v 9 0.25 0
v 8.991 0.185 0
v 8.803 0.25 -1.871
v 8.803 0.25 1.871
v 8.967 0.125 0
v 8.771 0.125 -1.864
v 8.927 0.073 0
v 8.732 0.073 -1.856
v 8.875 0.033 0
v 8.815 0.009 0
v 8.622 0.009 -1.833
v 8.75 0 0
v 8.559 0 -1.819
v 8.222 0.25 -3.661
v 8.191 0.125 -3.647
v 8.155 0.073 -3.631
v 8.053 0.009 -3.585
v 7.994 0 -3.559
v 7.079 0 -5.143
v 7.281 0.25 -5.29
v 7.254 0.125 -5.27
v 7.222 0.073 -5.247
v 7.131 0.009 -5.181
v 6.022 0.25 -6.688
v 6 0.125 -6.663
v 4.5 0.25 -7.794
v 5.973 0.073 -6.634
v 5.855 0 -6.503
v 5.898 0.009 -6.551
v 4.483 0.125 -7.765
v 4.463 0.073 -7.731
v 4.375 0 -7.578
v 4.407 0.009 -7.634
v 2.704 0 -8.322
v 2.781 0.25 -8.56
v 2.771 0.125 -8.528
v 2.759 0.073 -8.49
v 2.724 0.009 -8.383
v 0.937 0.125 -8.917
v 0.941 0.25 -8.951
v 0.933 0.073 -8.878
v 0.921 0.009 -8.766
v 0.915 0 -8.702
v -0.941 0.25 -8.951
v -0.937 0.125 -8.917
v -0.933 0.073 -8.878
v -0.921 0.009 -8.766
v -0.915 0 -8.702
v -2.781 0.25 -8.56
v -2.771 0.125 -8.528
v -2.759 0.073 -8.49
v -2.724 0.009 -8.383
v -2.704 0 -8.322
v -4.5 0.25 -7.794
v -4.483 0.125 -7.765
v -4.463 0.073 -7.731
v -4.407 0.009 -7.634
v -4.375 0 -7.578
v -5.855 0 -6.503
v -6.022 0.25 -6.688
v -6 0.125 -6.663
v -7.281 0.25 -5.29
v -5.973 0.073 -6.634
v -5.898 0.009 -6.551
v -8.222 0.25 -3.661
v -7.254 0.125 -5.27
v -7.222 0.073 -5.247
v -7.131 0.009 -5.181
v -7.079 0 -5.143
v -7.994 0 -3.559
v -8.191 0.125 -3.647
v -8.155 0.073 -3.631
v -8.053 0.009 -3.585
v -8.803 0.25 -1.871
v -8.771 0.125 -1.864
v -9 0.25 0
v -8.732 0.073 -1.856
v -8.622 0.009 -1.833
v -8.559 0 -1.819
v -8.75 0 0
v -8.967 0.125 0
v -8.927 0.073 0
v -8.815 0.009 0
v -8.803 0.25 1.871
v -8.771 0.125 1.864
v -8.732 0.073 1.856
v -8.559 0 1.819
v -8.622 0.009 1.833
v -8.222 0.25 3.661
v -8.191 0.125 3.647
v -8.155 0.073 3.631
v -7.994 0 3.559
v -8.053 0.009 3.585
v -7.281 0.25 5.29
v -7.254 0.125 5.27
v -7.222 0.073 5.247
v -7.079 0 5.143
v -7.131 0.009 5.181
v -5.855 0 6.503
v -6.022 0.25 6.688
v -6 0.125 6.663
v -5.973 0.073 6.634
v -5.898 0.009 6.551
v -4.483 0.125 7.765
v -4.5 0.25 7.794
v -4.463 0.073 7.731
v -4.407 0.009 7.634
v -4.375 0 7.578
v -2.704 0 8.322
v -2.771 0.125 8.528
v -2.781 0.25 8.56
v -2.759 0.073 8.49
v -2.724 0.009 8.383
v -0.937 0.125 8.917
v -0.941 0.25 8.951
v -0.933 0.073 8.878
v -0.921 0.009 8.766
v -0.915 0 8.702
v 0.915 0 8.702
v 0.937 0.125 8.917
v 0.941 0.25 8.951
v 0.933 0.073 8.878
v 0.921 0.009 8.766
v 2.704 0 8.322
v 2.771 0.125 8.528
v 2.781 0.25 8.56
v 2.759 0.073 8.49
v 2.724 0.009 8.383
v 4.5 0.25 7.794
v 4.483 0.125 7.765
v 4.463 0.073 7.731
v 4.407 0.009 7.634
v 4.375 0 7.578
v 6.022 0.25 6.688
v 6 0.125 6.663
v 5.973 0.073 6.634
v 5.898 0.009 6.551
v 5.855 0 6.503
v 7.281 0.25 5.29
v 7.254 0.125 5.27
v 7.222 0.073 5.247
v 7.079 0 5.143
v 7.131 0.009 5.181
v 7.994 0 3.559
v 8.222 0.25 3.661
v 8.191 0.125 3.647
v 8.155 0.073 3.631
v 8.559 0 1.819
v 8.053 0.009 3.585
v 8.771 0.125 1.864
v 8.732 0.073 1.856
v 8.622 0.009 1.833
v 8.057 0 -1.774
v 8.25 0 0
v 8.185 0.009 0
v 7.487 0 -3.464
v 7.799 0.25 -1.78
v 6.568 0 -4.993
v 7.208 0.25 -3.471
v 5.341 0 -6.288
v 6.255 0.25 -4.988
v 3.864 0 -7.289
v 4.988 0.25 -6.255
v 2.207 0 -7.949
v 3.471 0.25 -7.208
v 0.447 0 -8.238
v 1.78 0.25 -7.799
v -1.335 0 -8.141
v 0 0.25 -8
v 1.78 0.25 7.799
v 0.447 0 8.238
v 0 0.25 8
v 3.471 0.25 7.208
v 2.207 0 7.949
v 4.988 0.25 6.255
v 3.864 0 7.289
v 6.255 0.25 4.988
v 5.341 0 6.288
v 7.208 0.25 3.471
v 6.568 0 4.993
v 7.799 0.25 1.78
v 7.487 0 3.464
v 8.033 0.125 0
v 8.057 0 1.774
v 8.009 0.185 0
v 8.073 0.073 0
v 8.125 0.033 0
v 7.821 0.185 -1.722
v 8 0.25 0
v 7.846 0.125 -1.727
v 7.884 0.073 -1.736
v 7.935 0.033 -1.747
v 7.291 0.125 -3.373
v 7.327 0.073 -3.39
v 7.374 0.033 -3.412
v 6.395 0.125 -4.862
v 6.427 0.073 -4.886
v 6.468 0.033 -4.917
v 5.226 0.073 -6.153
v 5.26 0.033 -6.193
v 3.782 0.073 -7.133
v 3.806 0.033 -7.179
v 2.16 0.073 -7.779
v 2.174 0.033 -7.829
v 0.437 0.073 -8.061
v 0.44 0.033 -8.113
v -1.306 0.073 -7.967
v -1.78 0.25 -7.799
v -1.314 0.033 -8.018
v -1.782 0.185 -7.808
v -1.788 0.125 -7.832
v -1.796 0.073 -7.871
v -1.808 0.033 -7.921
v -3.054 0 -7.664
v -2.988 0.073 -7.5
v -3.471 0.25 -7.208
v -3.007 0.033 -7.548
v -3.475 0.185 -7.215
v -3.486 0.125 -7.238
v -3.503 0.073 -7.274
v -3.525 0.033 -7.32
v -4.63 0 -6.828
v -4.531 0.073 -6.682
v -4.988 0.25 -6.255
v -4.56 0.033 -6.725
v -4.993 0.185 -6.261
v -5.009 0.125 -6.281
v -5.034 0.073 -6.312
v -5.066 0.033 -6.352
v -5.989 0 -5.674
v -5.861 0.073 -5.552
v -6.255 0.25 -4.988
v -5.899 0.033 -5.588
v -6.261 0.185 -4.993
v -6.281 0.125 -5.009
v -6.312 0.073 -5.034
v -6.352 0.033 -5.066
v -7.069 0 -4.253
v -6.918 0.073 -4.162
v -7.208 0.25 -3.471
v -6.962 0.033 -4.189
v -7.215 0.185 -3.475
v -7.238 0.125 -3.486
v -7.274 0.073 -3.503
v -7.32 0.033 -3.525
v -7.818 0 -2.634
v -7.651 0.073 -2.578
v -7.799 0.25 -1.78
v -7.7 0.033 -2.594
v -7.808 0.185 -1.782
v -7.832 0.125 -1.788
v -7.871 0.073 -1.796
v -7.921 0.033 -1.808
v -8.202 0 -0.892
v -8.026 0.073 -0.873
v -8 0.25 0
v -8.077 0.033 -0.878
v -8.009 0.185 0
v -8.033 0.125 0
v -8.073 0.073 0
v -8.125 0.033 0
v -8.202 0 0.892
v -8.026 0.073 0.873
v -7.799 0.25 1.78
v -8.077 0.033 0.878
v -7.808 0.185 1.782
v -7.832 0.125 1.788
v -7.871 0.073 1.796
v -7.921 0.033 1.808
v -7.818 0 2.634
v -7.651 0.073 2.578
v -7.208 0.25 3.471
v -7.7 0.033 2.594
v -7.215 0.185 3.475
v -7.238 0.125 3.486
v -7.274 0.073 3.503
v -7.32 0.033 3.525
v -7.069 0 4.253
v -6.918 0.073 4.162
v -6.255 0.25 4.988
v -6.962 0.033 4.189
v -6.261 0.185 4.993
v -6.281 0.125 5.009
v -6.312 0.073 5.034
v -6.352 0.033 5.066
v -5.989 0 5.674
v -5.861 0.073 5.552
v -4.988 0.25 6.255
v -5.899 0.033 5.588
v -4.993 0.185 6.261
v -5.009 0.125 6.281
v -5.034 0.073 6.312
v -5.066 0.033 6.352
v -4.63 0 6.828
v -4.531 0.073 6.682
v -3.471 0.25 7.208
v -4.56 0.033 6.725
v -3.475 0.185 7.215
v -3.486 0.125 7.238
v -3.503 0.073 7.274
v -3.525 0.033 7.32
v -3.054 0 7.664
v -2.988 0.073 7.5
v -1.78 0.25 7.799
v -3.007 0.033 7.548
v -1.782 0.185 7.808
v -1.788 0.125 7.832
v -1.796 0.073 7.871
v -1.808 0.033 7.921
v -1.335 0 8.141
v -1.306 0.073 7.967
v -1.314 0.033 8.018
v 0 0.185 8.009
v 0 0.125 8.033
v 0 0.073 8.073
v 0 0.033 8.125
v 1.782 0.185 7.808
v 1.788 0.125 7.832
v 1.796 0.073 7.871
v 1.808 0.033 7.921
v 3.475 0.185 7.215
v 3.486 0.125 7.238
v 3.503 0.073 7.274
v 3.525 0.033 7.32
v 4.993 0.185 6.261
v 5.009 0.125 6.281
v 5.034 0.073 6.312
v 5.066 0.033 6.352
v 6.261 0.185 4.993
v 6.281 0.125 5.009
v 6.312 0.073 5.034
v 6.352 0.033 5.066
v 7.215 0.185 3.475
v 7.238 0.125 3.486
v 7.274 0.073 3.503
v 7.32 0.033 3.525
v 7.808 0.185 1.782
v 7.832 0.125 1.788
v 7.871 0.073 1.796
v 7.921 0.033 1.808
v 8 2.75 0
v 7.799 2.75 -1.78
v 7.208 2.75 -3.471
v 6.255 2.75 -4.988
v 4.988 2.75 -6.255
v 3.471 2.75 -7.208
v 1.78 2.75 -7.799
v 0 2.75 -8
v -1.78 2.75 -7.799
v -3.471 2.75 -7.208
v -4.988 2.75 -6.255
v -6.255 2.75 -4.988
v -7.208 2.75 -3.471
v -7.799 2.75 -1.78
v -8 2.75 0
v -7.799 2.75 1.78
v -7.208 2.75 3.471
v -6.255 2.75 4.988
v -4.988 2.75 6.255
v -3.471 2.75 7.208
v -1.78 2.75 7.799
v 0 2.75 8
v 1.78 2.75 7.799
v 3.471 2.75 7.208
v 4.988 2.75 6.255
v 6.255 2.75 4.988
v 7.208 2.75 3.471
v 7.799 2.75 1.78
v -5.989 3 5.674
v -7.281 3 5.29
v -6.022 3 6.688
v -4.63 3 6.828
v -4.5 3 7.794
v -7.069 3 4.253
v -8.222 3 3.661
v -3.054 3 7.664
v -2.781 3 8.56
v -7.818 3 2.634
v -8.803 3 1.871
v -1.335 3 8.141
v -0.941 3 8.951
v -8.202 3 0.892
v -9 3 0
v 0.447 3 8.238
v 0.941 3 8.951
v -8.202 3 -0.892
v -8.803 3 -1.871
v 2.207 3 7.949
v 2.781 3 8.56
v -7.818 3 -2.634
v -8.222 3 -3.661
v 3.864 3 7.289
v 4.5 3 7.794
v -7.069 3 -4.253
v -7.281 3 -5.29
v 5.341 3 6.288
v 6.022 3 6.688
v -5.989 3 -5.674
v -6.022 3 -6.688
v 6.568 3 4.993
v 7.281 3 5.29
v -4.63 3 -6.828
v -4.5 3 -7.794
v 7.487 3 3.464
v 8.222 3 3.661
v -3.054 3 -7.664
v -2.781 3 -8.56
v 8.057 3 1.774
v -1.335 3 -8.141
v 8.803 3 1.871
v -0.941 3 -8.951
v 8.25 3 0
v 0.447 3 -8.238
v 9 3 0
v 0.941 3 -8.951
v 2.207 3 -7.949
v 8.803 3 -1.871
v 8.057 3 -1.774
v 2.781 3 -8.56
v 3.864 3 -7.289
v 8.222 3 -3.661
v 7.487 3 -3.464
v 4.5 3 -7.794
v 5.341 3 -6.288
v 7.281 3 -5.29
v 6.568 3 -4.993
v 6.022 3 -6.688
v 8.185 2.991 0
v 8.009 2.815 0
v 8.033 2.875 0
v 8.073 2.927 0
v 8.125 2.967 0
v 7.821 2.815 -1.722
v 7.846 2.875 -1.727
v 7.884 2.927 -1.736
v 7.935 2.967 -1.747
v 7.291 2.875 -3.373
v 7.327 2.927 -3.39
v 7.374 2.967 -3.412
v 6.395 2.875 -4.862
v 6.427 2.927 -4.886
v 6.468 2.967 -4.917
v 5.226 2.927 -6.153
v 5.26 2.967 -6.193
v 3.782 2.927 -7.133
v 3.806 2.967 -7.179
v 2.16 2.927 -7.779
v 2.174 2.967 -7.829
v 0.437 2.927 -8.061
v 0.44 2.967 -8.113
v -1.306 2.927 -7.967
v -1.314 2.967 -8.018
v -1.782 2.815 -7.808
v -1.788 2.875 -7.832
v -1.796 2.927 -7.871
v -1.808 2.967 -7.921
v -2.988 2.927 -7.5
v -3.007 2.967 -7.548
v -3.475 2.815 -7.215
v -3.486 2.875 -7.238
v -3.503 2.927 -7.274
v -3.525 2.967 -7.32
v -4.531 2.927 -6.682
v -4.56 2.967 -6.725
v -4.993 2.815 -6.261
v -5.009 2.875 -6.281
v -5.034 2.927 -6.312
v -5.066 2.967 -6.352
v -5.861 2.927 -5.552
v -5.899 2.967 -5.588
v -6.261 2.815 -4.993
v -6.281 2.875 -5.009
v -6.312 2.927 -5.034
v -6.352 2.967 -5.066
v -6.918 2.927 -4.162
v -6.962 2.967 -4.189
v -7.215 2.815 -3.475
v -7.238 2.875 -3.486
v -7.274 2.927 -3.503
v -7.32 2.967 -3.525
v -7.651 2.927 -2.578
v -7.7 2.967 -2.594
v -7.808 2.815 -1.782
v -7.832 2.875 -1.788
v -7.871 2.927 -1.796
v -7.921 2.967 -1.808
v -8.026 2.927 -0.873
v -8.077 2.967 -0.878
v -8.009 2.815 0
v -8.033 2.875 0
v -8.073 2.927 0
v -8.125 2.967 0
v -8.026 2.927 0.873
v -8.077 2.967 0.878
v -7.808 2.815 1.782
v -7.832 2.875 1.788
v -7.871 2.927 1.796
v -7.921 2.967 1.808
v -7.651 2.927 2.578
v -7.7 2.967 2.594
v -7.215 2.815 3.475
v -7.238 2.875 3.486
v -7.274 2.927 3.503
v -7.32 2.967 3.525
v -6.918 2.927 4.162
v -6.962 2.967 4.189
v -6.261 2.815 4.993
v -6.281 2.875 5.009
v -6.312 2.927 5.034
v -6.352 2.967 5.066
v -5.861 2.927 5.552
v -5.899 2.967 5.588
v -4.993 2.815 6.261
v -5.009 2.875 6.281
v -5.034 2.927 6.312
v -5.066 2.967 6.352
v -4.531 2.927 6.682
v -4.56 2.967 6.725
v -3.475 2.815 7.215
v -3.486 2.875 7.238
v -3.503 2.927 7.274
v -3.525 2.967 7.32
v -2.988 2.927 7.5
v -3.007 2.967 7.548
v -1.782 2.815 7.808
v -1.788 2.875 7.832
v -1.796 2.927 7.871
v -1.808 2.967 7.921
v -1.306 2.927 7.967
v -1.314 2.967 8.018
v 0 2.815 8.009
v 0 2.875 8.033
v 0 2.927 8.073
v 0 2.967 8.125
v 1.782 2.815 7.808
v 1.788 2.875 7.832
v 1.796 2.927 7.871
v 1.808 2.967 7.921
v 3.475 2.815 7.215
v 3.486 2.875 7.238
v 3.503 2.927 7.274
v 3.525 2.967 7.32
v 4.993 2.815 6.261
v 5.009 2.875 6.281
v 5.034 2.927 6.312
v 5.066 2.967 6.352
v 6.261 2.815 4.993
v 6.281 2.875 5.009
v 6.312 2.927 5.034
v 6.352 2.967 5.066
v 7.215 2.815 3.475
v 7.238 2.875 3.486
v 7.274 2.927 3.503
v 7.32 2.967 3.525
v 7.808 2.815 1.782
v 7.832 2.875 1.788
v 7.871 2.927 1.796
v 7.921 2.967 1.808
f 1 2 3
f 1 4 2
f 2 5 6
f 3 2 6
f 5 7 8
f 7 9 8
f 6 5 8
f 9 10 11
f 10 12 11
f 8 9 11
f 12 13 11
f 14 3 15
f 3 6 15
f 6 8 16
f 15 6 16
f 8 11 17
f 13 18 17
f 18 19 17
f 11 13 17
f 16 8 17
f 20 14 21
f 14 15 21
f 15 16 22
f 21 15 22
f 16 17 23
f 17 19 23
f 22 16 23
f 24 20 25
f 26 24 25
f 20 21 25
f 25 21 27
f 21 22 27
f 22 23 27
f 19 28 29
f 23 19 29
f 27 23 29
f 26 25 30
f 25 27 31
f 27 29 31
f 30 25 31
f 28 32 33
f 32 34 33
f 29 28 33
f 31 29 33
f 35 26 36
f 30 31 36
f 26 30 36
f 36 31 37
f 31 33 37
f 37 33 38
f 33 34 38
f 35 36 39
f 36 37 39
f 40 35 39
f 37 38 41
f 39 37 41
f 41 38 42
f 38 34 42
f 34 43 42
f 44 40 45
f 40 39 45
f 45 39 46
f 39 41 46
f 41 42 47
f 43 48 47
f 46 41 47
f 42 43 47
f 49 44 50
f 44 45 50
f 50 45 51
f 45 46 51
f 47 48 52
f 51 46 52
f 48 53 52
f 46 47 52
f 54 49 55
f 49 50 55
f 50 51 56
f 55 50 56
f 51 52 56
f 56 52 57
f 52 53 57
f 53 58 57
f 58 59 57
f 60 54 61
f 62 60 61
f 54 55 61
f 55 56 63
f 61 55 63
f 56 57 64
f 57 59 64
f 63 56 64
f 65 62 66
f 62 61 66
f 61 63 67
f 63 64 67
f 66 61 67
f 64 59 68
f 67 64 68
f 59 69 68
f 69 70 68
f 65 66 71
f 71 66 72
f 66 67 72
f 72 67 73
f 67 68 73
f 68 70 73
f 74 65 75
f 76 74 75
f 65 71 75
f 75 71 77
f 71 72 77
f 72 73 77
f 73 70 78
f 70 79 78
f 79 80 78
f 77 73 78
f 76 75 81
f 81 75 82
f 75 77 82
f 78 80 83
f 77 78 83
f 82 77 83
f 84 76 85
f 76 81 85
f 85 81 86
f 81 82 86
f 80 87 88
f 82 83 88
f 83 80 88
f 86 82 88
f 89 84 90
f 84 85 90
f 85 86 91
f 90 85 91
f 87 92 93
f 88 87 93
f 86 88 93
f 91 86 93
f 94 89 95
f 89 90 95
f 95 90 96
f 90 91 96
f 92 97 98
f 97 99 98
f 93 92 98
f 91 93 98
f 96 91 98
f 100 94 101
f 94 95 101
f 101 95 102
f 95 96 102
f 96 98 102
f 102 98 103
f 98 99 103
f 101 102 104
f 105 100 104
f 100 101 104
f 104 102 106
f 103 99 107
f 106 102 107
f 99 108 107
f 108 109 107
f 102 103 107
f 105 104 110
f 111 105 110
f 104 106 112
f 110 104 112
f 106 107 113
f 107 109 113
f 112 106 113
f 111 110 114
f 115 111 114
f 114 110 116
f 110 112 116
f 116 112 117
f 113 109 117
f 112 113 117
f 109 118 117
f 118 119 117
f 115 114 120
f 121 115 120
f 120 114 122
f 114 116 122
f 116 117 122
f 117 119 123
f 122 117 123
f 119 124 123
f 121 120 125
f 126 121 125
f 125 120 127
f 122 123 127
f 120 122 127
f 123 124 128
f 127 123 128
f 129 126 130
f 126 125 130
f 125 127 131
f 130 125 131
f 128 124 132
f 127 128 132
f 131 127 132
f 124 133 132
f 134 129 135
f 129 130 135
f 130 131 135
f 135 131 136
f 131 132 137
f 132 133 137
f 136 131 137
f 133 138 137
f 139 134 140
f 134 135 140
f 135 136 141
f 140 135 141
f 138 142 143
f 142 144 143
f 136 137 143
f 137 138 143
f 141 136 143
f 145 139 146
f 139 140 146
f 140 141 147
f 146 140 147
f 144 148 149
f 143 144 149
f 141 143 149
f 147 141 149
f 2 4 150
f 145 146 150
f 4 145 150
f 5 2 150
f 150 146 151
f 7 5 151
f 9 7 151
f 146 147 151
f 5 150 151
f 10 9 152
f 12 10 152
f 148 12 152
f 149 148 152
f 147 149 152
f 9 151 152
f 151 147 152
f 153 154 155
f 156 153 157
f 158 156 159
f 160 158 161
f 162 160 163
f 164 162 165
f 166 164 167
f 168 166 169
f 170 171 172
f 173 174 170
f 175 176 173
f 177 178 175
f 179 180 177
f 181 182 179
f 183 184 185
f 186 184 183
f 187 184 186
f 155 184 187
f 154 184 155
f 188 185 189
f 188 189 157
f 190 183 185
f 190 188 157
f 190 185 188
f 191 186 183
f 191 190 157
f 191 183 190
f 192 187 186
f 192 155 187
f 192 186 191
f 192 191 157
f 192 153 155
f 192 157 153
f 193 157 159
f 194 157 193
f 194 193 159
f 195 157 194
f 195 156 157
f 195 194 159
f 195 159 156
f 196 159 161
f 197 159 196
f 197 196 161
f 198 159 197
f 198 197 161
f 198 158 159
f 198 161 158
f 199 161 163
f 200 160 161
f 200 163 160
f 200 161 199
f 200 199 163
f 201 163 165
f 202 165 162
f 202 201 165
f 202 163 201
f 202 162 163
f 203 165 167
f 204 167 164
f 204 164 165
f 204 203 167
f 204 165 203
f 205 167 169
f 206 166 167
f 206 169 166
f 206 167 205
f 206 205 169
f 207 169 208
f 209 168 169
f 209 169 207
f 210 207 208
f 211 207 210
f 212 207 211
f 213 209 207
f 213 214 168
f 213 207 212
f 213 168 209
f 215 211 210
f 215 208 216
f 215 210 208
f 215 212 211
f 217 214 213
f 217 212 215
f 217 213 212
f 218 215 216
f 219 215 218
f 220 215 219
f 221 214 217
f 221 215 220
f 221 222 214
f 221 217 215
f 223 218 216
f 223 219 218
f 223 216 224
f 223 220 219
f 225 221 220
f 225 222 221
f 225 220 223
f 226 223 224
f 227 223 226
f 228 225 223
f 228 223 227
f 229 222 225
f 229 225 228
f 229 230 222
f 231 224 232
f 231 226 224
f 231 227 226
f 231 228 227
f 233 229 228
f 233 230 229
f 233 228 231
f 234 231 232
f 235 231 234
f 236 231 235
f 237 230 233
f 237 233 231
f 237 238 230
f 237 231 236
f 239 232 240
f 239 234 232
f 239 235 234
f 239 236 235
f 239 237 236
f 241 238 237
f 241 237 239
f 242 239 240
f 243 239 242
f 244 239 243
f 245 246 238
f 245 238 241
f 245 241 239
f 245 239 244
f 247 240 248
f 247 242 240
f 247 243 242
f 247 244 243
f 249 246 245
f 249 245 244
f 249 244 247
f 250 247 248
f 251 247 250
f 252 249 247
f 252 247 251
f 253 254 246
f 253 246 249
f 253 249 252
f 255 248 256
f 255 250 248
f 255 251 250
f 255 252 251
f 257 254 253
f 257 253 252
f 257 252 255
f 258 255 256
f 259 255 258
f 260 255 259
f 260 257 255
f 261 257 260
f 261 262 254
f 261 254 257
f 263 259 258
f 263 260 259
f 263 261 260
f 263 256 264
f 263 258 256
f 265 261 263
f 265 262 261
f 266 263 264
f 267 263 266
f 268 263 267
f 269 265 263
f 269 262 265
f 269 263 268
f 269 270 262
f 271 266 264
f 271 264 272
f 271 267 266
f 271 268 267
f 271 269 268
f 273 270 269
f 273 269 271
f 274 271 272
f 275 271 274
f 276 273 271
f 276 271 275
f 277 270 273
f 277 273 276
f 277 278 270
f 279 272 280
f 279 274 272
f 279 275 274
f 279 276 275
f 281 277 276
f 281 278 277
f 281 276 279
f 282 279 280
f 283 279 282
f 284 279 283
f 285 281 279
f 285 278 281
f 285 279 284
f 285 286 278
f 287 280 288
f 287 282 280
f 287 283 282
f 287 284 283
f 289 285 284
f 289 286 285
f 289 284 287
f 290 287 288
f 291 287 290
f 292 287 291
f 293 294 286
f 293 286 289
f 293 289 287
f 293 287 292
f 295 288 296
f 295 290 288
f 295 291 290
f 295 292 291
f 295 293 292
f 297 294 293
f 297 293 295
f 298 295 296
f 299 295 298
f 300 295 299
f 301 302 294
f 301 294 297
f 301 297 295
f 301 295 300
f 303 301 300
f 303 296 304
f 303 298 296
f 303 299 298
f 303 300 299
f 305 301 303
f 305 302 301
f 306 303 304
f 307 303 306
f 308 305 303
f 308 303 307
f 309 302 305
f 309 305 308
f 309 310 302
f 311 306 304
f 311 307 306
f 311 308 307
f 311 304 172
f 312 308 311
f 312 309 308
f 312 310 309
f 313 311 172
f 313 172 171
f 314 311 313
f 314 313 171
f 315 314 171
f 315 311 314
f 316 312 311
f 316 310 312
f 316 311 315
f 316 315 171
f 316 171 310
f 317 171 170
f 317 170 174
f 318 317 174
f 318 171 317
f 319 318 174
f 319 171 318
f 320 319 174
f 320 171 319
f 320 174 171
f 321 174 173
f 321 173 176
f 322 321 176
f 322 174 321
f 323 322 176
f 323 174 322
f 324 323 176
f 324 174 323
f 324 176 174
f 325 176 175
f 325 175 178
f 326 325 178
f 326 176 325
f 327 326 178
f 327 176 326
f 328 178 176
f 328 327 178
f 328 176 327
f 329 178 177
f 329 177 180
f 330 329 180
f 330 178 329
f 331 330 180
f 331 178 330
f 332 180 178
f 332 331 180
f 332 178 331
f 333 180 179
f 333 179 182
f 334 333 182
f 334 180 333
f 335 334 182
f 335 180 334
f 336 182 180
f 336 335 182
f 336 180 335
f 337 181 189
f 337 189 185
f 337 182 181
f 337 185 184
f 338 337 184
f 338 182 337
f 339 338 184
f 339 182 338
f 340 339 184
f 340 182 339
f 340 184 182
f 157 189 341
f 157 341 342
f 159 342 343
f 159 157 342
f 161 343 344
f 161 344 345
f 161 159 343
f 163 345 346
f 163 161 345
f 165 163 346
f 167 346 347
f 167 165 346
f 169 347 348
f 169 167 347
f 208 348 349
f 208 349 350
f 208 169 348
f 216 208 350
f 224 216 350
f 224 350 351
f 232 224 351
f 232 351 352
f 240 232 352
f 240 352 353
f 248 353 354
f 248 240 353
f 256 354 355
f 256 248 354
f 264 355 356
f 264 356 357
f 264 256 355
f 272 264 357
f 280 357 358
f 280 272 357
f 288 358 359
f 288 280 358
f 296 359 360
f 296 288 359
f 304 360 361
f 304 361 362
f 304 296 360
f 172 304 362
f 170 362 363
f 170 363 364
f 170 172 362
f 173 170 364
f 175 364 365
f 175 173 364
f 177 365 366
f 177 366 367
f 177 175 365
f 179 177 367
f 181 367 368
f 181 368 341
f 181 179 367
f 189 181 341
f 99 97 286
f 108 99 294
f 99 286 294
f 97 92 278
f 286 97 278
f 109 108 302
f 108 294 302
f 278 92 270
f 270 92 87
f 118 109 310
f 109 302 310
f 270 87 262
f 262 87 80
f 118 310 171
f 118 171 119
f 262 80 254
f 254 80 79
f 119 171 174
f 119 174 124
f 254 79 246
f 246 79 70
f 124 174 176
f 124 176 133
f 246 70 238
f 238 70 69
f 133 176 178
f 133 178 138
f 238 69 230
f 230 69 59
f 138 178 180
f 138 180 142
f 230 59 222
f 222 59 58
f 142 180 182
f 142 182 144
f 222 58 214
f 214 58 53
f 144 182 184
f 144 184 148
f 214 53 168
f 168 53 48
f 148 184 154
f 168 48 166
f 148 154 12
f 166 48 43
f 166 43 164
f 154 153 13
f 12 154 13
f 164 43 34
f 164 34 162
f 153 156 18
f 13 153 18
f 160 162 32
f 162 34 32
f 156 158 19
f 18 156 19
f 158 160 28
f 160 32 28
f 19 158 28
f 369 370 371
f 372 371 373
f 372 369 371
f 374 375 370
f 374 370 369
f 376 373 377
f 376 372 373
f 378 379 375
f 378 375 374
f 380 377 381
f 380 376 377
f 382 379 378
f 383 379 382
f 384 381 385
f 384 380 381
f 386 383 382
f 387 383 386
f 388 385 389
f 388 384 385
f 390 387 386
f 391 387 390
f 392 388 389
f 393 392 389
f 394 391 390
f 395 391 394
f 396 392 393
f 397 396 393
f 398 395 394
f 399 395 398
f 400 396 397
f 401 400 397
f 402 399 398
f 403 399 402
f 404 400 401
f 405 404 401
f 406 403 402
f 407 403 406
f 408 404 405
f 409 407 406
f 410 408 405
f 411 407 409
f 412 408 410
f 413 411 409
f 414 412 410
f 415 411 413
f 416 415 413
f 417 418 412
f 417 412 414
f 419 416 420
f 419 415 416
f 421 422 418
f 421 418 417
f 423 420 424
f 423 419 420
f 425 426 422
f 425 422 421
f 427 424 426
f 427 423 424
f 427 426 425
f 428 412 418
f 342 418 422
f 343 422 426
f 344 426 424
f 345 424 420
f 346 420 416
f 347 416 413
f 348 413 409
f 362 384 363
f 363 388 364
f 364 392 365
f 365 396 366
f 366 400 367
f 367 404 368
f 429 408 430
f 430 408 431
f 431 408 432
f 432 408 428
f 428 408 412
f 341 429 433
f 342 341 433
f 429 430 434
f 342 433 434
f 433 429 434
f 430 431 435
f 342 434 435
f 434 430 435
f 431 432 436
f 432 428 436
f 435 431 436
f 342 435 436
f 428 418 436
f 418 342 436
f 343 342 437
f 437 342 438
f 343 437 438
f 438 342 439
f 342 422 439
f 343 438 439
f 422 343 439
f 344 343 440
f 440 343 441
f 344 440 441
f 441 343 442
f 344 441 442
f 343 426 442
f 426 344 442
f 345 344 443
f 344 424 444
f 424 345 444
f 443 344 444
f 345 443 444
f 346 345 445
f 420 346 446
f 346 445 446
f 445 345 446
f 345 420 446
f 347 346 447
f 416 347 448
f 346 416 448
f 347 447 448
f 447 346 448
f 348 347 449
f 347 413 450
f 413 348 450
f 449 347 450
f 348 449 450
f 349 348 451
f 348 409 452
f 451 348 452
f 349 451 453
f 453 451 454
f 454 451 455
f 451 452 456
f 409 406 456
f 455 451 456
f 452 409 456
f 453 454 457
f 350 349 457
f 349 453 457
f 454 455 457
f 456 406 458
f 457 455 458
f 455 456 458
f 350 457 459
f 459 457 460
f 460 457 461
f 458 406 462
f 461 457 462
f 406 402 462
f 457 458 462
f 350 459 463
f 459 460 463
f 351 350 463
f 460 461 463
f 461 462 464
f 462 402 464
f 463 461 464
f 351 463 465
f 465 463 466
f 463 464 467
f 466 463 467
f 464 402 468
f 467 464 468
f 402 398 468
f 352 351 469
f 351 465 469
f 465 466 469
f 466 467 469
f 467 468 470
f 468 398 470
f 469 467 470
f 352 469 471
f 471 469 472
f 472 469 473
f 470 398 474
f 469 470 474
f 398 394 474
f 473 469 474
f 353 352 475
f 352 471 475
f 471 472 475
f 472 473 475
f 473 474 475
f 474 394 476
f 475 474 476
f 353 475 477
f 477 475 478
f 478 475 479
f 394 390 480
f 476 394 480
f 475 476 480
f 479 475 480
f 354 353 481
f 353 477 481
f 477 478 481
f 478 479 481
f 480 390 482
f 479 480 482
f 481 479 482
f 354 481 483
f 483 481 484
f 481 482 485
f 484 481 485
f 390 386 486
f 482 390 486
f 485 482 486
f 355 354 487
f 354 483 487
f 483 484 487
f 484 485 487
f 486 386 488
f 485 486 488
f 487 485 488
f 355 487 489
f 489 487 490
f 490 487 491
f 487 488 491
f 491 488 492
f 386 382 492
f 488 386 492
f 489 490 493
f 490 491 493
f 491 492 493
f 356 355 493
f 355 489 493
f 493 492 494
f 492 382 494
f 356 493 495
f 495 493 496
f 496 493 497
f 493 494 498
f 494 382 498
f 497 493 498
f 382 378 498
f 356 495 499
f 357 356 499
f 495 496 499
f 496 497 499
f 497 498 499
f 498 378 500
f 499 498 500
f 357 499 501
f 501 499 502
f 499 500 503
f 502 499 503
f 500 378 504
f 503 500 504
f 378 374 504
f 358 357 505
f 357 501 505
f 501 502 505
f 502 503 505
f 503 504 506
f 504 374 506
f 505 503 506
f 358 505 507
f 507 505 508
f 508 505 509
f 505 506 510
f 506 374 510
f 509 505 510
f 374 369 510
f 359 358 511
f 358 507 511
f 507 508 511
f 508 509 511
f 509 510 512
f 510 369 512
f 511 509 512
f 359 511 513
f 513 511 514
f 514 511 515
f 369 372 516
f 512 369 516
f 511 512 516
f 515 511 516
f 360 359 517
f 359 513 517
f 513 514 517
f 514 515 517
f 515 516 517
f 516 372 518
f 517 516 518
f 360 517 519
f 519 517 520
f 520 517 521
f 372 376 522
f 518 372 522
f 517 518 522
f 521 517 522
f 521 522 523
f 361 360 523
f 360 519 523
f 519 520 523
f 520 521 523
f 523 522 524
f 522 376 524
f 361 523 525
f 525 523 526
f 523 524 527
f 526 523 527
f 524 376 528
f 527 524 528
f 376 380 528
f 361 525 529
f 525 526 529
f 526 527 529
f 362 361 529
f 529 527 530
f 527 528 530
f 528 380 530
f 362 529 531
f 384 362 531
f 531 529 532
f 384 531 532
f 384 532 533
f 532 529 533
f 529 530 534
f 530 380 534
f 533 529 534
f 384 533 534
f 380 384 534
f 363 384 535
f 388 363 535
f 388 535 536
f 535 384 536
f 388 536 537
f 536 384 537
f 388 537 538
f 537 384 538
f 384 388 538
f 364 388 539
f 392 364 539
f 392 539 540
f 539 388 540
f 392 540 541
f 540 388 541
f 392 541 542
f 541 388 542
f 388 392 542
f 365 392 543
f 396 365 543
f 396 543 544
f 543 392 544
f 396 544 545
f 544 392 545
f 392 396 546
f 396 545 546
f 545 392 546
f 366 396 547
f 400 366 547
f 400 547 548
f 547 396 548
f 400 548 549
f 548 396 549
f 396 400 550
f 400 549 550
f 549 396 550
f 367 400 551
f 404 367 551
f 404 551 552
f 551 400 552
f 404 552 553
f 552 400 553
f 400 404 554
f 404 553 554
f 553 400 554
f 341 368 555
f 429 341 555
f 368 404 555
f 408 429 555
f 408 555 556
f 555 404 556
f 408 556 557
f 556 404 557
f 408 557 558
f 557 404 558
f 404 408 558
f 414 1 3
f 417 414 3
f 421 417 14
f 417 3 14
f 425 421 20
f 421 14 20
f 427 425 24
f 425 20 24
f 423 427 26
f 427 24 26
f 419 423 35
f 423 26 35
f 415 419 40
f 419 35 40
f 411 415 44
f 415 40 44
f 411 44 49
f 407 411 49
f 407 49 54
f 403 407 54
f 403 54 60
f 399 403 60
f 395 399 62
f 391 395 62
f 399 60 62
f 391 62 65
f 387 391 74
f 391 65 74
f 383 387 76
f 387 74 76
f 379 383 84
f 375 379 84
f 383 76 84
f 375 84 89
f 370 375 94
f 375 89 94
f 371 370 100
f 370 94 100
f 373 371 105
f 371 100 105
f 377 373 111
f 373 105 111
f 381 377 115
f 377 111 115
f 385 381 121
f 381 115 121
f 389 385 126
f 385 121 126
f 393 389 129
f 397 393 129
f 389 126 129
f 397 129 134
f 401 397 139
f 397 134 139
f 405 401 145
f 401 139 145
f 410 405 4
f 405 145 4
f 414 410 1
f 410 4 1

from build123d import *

# Parameters (mm, degrees)
SKETCH_1_R      = 9
SKETCH_1_R_2    = 8
EXTRUDE_1_DEPTH = 3
FILLET_1_R      = 0.25


with BuildPart() as part:
    # 草图1 → 凸台-拉伸1 (new body)
    with BuildSketch(Plane(origin=(0, 0, 0), x_dir=(1, 0, 0), z_dir=(0, 1, 0))):
        Circle(SKETCH_1_R)
        Circle(SKETCH_1_R_2, mode=Mode.SUBTRACT)
    extrude(amount=EXTRUDE_1_DEPTH)

    # 圆角1
    fillet_1_edges = [part.edges().sort_by_distance(p)[0] for p in [
        (-9, 0, 0),
        (-8, 0, 0),
        (-8, 3, 0),
    ]]
    fillet(fillet_1_edges, radius=FILLET_1_R)


solid = part.part
